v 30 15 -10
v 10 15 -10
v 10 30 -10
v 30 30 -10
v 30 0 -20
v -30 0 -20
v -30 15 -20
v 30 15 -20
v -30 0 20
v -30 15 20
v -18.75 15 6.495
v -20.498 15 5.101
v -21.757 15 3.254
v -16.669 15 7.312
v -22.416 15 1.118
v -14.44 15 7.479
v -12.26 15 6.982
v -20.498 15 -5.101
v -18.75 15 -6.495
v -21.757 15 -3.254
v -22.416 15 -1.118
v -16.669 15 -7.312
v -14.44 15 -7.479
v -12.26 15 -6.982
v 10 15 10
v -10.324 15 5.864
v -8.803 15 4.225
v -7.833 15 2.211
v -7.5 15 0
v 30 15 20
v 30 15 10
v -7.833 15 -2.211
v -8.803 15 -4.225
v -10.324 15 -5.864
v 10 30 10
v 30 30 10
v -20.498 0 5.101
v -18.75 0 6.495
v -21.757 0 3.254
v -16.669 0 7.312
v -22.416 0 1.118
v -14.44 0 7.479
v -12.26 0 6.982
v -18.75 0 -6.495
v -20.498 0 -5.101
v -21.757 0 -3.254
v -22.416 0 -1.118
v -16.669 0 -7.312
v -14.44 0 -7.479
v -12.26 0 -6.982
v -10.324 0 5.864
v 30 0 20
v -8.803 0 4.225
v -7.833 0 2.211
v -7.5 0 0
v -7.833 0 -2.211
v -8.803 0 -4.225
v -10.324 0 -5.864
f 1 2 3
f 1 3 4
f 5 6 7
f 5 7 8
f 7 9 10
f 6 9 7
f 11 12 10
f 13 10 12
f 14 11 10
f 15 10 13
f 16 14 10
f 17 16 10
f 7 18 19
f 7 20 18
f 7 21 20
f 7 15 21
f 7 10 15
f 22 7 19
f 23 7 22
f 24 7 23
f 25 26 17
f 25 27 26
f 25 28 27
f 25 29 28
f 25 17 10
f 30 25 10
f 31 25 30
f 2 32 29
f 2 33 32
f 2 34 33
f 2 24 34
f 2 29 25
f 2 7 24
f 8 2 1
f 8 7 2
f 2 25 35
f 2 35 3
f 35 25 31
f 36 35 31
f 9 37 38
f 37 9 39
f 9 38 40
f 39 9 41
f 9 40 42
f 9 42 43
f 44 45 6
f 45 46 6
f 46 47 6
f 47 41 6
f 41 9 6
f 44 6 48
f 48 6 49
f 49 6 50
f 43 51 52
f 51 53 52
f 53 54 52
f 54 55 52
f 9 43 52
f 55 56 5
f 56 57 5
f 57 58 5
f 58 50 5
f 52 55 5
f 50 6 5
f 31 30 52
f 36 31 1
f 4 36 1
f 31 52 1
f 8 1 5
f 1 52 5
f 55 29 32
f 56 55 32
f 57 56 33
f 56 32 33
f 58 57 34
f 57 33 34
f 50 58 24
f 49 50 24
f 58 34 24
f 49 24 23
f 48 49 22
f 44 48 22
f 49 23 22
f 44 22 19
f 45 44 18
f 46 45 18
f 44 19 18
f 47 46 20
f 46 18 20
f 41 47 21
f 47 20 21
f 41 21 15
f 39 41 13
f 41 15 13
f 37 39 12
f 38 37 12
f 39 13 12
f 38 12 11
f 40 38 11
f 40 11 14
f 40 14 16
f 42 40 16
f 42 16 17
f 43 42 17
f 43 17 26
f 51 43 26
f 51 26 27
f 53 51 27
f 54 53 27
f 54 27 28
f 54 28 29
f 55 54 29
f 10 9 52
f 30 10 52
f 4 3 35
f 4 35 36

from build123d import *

# Parameters (mm, degrees)
SKETCH1_W           = 60
SKETCH1_H           = 40
BOSS_EXTRUDE1_DEPTH = 15
CUT_EXTRUDE1_REACH  = 17
SKETCH2_R           = 7.5
SKETCH3_W           = 20
SKETCH3_H           = 20
BOSS_EXTRUDE2_DEPTH = 15


with BuildPart() as part:
    # Sketch1 → Boss-Extrude1 (new body)
    with BuildSketch(Plane(origin=(0, 0, 0), x_dir=(1, 0, 0), z_dir=(0, 1, 0))):
        Rectangle(SKETCH1_W, SKETCH1_H)
    extrude(amount=BOSS_EXTRUDE1_DEPTH)

    # Sketch2 → Cut-Extrude1 (cut, up to next)
    with BuildSketch(Plane(origin=(0, 15, 0), x_dir=(1, 0, 0), z_dir=(0, 1, 0)), mode=Mode.PRIVATE) as cut_extrude1_sk1:
        with Locations((-15, 0)):
            Circle(SKETCH2_R)
    cut_extrude1_tool1 = extrude(cut_extrude1_sk1.sketch, amount=-CUT_EXTRUDE1_REACH, mode=Mode.PRIVATE) & part.part
    add(cut_extrude1_tool1.solids().sort_by_distance((-15, 15, 0))[0], mode=Mode.SUBTRACT)

    # Sketch3 → Boss-Extrude2 (add)
    with BuildSketch(Plane(origin=(0, 15, 0), x_dir=(1, 0, 0), z_dir=(0, 1, 0))):
        with Locations((20, 0)):
            Rectangle(SKETCH3_W, SKETCH3_H)
    extrude(amount=BOSS_EXTRUDE2_DEPTH)


solid = part.part
